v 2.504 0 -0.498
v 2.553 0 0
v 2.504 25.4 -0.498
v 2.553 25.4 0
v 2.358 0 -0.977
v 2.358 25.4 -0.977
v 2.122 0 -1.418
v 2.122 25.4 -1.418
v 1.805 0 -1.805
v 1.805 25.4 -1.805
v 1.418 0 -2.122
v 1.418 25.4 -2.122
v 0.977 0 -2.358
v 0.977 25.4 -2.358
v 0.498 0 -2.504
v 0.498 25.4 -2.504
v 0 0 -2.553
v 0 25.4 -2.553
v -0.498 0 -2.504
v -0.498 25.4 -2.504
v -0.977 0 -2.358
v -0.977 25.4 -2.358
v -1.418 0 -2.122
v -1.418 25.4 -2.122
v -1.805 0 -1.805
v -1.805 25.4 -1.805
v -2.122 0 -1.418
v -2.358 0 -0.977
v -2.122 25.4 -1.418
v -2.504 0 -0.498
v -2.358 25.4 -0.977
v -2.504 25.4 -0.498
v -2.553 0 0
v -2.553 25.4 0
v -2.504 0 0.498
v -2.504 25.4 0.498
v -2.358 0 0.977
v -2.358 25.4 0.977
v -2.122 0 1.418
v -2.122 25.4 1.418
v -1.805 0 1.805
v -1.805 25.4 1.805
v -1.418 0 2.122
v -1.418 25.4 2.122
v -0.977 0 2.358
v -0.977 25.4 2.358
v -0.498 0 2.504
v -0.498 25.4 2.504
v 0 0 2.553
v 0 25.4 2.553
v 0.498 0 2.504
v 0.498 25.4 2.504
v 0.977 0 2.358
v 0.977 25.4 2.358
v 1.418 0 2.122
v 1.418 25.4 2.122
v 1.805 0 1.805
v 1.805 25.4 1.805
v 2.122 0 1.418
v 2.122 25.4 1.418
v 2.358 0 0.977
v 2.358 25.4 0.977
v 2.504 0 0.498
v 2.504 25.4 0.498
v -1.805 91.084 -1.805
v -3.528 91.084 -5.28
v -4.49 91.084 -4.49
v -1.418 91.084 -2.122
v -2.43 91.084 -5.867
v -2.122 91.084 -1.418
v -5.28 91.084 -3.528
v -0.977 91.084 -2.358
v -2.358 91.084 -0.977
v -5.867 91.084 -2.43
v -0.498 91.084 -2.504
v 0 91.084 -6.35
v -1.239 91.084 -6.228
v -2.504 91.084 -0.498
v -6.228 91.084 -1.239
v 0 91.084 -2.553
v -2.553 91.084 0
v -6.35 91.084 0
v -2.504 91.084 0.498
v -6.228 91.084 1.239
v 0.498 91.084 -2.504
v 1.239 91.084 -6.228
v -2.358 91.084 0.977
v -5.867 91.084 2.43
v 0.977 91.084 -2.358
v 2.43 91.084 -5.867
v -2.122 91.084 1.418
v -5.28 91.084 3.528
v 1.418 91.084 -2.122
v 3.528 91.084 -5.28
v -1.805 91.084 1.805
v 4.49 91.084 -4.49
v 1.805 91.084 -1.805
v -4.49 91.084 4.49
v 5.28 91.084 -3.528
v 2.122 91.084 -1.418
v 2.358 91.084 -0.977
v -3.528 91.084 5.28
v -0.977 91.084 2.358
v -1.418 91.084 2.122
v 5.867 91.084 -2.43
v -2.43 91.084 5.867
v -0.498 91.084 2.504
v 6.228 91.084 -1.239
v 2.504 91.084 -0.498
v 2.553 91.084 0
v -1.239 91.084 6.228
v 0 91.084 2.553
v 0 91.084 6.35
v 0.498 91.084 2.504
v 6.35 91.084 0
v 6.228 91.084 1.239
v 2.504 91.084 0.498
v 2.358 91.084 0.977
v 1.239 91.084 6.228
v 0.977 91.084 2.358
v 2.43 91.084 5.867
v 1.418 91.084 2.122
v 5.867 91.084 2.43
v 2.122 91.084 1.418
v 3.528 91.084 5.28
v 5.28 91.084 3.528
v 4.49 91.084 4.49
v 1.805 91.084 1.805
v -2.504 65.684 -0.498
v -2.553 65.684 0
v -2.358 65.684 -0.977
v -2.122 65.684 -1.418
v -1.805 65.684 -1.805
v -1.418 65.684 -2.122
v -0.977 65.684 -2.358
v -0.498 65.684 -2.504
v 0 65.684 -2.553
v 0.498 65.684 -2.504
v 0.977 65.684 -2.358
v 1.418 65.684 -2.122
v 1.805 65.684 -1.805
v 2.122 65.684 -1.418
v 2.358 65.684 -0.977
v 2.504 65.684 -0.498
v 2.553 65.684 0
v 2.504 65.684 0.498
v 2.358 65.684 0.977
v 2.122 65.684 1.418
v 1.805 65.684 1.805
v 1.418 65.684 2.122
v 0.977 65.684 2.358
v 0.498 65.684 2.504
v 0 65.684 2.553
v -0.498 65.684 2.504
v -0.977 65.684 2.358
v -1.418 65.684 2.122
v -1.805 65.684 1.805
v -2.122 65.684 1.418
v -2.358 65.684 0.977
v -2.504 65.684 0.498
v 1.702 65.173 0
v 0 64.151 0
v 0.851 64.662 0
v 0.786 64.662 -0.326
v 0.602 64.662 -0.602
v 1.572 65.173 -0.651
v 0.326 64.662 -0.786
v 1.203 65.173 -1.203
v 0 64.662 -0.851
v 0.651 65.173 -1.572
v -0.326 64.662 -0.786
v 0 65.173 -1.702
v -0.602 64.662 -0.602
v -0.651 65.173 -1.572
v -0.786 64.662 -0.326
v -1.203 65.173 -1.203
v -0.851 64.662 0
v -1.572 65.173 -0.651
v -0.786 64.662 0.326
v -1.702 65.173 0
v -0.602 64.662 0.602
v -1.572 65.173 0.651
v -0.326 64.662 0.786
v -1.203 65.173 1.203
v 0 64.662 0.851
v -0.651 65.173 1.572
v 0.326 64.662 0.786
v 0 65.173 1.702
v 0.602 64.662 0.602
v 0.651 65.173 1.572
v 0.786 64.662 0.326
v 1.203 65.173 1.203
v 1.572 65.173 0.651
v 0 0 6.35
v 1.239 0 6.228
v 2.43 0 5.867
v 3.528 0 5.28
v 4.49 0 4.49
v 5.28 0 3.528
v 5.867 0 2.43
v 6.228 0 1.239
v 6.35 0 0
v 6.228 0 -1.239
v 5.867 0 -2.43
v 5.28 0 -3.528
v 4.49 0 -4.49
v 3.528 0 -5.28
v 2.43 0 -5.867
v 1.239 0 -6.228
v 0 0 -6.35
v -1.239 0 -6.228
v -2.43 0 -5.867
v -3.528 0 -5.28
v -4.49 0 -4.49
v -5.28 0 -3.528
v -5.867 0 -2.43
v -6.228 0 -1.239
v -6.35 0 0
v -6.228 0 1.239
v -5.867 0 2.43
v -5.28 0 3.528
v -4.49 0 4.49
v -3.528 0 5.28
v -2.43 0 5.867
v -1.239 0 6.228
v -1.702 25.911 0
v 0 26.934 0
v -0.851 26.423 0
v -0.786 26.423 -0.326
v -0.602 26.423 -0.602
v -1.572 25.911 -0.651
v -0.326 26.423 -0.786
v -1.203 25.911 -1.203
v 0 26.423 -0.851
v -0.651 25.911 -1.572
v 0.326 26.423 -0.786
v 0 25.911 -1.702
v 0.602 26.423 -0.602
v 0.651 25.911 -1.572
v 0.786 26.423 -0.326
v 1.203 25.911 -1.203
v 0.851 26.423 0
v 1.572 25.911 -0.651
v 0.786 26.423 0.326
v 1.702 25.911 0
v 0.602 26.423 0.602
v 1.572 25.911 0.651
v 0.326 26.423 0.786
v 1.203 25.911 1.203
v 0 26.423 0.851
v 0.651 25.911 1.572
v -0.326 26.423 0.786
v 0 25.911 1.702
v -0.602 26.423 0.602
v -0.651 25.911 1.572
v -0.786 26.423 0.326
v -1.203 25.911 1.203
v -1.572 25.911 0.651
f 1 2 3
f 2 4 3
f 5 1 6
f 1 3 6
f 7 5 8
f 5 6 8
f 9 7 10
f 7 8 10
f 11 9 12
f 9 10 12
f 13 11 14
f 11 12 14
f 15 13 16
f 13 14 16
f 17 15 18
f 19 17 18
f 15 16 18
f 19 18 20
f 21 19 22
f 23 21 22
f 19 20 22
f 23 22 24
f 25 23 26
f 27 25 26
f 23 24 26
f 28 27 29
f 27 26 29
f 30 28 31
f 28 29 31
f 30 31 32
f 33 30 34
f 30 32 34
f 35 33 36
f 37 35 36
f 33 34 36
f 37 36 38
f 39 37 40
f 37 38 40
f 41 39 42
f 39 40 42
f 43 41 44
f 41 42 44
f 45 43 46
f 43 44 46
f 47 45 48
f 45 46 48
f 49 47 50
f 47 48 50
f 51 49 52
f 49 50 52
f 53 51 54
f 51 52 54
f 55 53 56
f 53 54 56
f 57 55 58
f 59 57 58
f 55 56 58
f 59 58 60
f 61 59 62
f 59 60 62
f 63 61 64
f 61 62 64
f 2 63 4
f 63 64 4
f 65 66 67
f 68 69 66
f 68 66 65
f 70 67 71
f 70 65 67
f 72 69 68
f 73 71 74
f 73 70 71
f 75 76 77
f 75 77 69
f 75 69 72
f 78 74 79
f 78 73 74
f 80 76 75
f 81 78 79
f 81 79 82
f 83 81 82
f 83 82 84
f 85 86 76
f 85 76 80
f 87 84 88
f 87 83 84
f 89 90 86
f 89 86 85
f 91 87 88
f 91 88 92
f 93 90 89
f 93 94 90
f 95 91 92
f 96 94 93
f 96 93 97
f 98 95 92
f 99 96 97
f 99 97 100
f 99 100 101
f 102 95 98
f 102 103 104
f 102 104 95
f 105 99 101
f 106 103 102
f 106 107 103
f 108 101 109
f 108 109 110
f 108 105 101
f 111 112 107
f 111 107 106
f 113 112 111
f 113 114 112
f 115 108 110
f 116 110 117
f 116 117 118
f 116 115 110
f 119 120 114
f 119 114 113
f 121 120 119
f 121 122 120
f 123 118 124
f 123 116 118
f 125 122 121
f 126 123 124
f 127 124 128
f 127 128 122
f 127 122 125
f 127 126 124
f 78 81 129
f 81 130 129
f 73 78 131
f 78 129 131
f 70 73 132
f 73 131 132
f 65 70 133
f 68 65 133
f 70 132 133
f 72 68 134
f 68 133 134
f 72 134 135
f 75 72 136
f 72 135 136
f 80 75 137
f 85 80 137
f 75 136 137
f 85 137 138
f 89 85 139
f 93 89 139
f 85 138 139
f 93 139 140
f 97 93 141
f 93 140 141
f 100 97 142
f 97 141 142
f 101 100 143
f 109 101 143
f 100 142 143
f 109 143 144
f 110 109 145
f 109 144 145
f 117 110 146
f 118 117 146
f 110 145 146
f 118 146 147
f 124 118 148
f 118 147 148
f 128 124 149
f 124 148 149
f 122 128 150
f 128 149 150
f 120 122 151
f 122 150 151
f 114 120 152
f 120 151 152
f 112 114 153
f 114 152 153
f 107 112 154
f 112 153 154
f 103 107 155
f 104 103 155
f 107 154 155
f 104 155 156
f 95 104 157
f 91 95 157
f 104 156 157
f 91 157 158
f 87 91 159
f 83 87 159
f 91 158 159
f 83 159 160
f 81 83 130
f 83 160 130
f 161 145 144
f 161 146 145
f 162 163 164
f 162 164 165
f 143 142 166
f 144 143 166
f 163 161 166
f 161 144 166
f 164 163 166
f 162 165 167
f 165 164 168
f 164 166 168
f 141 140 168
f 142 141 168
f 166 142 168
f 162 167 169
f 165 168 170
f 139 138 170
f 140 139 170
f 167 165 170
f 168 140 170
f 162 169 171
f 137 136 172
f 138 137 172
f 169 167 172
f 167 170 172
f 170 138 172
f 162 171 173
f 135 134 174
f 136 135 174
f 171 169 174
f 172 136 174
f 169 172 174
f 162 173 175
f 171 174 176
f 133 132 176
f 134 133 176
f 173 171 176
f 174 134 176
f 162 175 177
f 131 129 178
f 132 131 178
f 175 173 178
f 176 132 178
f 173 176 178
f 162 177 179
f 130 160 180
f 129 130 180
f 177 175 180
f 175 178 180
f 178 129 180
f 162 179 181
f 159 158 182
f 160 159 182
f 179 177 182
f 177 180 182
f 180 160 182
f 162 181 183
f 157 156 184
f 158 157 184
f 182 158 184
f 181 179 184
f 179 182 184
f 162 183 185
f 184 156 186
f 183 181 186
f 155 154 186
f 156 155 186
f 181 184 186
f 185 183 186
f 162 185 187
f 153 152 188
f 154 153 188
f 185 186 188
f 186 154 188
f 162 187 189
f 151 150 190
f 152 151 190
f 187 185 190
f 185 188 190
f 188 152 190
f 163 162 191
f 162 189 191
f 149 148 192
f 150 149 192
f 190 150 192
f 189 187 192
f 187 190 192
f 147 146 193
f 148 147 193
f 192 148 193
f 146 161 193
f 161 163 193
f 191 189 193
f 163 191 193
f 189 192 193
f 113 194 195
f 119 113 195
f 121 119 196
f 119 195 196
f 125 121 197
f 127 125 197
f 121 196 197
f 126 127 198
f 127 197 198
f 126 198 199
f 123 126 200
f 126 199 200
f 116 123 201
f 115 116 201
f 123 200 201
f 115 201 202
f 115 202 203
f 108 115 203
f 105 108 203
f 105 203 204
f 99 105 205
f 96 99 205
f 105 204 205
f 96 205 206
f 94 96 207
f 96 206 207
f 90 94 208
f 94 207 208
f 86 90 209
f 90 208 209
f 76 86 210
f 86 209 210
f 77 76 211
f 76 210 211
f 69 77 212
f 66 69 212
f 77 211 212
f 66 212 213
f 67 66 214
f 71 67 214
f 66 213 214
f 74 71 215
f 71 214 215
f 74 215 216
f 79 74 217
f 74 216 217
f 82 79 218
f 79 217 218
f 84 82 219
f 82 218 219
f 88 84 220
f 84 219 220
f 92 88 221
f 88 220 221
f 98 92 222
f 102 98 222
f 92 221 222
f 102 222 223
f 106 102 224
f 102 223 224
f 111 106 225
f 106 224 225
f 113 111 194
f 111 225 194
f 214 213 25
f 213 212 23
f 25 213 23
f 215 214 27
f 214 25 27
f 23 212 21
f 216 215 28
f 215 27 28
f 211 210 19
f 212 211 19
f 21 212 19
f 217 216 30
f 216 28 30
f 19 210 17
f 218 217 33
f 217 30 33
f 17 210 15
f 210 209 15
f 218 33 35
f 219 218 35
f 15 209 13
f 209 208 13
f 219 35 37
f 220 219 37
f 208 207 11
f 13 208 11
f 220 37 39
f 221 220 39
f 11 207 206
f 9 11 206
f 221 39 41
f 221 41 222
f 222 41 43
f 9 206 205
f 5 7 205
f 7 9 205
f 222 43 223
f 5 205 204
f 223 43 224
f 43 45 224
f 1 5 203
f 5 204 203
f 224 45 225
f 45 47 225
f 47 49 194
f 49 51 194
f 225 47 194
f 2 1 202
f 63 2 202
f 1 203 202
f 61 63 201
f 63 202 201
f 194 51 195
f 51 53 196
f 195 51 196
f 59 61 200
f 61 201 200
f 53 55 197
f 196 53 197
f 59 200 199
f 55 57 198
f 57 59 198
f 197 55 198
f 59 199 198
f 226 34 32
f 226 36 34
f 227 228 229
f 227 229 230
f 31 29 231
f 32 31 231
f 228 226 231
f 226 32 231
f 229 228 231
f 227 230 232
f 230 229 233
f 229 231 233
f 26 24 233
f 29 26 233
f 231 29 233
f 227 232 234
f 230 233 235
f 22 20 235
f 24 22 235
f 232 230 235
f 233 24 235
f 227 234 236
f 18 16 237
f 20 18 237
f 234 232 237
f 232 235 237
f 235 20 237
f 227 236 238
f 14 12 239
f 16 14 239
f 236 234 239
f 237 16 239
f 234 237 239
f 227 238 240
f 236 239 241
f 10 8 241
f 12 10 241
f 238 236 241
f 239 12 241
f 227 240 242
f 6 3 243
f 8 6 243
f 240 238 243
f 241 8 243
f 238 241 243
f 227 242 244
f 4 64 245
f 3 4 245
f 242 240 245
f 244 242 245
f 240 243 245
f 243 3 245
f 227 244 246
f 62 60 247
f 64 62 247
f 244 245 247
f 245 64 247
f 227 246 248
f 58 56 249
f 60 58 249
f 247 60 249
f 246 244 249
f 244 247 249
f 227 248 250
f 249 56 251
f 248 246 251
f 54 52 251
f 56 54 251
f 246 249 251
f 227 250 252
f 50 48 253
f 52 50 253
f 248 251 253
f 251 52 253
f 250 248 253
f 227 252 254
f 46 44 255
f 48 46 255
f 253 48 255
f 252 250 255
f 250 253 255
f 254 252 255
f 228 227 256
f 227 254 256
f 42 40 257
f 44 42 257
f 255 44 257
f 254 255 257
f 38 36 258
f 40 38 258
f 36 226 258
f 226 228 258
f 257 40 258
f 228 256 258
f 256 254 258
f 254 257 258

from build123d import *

# Parameters (mm, degrees)
SKETCH1_R                   = 6.35
BOSS_EXTRUDE1_DEPTH         = 91.0844
F_1_4_20_TAPPED_HOLE1_D     = 5.1054
F_1_4_20_TAPPED_HOLE1_DEPTH = 25.4
F_1_4_20_TAPPED_HOLE1_TIP   = 1.533816902
F_1_4_20_TAPPED_HOLE2_D     = 5.1054
F_1_4_20_TAPPED_HOLE2_DEPTH = 25.4
F_1_4_20_TAPPED_HOLE2_TIP   = 1.533816902


with BuildPart() as part:
    # Sketch1 → Boss-Extrude1 (new body)
    with BuildSketch(Plane(origin=(0, 0, 0), x_dir=(1, 0, 0), z_dir=(0, 1, 0))):
        with Locations(Location((0, 0, 0), (0, 0, 270))):
            Circle(SKETCH1_R)
    extrude(amount=BOSS_EXTRUDE1_DEPTH)

    # 1/4-20 Tapped Hole1
    with Locations(Plane(origin=(0, 91.0844, 0), x_dir=(1, 0, 0), z_dir=(0, 1, 0))):
        with Locations((0, 0)):
            Hole(F_1_4_20_TAPPED_HOLE1_D / 2, depth=F_1_4_20_TAPPED_HOLE1_DEPTH)
            with Locations((0, 0, -(F_1_4_20_TAPPED_HOLE1_DEPTH + F_1_4_20_TAPPED_HOLE1_TIP / 2))):  # 118° drill point
                Cone(0, F_1_4_20_TAPPED_HOLE1_D / 2, F_1_4_20_TAPPED_HOLE1_TIP, mode=Mode.SUBTRACT)

    # 1/4-20 Tapped Hole2
    with Locations(Plane(origin=(0, 0, 0), x_dir=(-1, 0, 0), z_dir=(0, -1, 0))):
        with Locations((0, 0)):
            Hole(F_1_4_20_TAPPED_HOLE2_D / 2, depth=F_1_4_20_TAPPED_HOLE2_DEPTH)
            with Locations((0, 0, -(F_1_4_20_TAPPED_HOLE2_DEPTH + F_1_4_20_TAPPED_HOLE2_TIP / 2))):  # 118° drill point
                Cone(0, F_1_4_20_TAPPED_HOLE2_D / 2, F_1_4_20_TAPPED_HOLE2_TIP, mode=Mode.SUBTRACT)


solid = part.part
